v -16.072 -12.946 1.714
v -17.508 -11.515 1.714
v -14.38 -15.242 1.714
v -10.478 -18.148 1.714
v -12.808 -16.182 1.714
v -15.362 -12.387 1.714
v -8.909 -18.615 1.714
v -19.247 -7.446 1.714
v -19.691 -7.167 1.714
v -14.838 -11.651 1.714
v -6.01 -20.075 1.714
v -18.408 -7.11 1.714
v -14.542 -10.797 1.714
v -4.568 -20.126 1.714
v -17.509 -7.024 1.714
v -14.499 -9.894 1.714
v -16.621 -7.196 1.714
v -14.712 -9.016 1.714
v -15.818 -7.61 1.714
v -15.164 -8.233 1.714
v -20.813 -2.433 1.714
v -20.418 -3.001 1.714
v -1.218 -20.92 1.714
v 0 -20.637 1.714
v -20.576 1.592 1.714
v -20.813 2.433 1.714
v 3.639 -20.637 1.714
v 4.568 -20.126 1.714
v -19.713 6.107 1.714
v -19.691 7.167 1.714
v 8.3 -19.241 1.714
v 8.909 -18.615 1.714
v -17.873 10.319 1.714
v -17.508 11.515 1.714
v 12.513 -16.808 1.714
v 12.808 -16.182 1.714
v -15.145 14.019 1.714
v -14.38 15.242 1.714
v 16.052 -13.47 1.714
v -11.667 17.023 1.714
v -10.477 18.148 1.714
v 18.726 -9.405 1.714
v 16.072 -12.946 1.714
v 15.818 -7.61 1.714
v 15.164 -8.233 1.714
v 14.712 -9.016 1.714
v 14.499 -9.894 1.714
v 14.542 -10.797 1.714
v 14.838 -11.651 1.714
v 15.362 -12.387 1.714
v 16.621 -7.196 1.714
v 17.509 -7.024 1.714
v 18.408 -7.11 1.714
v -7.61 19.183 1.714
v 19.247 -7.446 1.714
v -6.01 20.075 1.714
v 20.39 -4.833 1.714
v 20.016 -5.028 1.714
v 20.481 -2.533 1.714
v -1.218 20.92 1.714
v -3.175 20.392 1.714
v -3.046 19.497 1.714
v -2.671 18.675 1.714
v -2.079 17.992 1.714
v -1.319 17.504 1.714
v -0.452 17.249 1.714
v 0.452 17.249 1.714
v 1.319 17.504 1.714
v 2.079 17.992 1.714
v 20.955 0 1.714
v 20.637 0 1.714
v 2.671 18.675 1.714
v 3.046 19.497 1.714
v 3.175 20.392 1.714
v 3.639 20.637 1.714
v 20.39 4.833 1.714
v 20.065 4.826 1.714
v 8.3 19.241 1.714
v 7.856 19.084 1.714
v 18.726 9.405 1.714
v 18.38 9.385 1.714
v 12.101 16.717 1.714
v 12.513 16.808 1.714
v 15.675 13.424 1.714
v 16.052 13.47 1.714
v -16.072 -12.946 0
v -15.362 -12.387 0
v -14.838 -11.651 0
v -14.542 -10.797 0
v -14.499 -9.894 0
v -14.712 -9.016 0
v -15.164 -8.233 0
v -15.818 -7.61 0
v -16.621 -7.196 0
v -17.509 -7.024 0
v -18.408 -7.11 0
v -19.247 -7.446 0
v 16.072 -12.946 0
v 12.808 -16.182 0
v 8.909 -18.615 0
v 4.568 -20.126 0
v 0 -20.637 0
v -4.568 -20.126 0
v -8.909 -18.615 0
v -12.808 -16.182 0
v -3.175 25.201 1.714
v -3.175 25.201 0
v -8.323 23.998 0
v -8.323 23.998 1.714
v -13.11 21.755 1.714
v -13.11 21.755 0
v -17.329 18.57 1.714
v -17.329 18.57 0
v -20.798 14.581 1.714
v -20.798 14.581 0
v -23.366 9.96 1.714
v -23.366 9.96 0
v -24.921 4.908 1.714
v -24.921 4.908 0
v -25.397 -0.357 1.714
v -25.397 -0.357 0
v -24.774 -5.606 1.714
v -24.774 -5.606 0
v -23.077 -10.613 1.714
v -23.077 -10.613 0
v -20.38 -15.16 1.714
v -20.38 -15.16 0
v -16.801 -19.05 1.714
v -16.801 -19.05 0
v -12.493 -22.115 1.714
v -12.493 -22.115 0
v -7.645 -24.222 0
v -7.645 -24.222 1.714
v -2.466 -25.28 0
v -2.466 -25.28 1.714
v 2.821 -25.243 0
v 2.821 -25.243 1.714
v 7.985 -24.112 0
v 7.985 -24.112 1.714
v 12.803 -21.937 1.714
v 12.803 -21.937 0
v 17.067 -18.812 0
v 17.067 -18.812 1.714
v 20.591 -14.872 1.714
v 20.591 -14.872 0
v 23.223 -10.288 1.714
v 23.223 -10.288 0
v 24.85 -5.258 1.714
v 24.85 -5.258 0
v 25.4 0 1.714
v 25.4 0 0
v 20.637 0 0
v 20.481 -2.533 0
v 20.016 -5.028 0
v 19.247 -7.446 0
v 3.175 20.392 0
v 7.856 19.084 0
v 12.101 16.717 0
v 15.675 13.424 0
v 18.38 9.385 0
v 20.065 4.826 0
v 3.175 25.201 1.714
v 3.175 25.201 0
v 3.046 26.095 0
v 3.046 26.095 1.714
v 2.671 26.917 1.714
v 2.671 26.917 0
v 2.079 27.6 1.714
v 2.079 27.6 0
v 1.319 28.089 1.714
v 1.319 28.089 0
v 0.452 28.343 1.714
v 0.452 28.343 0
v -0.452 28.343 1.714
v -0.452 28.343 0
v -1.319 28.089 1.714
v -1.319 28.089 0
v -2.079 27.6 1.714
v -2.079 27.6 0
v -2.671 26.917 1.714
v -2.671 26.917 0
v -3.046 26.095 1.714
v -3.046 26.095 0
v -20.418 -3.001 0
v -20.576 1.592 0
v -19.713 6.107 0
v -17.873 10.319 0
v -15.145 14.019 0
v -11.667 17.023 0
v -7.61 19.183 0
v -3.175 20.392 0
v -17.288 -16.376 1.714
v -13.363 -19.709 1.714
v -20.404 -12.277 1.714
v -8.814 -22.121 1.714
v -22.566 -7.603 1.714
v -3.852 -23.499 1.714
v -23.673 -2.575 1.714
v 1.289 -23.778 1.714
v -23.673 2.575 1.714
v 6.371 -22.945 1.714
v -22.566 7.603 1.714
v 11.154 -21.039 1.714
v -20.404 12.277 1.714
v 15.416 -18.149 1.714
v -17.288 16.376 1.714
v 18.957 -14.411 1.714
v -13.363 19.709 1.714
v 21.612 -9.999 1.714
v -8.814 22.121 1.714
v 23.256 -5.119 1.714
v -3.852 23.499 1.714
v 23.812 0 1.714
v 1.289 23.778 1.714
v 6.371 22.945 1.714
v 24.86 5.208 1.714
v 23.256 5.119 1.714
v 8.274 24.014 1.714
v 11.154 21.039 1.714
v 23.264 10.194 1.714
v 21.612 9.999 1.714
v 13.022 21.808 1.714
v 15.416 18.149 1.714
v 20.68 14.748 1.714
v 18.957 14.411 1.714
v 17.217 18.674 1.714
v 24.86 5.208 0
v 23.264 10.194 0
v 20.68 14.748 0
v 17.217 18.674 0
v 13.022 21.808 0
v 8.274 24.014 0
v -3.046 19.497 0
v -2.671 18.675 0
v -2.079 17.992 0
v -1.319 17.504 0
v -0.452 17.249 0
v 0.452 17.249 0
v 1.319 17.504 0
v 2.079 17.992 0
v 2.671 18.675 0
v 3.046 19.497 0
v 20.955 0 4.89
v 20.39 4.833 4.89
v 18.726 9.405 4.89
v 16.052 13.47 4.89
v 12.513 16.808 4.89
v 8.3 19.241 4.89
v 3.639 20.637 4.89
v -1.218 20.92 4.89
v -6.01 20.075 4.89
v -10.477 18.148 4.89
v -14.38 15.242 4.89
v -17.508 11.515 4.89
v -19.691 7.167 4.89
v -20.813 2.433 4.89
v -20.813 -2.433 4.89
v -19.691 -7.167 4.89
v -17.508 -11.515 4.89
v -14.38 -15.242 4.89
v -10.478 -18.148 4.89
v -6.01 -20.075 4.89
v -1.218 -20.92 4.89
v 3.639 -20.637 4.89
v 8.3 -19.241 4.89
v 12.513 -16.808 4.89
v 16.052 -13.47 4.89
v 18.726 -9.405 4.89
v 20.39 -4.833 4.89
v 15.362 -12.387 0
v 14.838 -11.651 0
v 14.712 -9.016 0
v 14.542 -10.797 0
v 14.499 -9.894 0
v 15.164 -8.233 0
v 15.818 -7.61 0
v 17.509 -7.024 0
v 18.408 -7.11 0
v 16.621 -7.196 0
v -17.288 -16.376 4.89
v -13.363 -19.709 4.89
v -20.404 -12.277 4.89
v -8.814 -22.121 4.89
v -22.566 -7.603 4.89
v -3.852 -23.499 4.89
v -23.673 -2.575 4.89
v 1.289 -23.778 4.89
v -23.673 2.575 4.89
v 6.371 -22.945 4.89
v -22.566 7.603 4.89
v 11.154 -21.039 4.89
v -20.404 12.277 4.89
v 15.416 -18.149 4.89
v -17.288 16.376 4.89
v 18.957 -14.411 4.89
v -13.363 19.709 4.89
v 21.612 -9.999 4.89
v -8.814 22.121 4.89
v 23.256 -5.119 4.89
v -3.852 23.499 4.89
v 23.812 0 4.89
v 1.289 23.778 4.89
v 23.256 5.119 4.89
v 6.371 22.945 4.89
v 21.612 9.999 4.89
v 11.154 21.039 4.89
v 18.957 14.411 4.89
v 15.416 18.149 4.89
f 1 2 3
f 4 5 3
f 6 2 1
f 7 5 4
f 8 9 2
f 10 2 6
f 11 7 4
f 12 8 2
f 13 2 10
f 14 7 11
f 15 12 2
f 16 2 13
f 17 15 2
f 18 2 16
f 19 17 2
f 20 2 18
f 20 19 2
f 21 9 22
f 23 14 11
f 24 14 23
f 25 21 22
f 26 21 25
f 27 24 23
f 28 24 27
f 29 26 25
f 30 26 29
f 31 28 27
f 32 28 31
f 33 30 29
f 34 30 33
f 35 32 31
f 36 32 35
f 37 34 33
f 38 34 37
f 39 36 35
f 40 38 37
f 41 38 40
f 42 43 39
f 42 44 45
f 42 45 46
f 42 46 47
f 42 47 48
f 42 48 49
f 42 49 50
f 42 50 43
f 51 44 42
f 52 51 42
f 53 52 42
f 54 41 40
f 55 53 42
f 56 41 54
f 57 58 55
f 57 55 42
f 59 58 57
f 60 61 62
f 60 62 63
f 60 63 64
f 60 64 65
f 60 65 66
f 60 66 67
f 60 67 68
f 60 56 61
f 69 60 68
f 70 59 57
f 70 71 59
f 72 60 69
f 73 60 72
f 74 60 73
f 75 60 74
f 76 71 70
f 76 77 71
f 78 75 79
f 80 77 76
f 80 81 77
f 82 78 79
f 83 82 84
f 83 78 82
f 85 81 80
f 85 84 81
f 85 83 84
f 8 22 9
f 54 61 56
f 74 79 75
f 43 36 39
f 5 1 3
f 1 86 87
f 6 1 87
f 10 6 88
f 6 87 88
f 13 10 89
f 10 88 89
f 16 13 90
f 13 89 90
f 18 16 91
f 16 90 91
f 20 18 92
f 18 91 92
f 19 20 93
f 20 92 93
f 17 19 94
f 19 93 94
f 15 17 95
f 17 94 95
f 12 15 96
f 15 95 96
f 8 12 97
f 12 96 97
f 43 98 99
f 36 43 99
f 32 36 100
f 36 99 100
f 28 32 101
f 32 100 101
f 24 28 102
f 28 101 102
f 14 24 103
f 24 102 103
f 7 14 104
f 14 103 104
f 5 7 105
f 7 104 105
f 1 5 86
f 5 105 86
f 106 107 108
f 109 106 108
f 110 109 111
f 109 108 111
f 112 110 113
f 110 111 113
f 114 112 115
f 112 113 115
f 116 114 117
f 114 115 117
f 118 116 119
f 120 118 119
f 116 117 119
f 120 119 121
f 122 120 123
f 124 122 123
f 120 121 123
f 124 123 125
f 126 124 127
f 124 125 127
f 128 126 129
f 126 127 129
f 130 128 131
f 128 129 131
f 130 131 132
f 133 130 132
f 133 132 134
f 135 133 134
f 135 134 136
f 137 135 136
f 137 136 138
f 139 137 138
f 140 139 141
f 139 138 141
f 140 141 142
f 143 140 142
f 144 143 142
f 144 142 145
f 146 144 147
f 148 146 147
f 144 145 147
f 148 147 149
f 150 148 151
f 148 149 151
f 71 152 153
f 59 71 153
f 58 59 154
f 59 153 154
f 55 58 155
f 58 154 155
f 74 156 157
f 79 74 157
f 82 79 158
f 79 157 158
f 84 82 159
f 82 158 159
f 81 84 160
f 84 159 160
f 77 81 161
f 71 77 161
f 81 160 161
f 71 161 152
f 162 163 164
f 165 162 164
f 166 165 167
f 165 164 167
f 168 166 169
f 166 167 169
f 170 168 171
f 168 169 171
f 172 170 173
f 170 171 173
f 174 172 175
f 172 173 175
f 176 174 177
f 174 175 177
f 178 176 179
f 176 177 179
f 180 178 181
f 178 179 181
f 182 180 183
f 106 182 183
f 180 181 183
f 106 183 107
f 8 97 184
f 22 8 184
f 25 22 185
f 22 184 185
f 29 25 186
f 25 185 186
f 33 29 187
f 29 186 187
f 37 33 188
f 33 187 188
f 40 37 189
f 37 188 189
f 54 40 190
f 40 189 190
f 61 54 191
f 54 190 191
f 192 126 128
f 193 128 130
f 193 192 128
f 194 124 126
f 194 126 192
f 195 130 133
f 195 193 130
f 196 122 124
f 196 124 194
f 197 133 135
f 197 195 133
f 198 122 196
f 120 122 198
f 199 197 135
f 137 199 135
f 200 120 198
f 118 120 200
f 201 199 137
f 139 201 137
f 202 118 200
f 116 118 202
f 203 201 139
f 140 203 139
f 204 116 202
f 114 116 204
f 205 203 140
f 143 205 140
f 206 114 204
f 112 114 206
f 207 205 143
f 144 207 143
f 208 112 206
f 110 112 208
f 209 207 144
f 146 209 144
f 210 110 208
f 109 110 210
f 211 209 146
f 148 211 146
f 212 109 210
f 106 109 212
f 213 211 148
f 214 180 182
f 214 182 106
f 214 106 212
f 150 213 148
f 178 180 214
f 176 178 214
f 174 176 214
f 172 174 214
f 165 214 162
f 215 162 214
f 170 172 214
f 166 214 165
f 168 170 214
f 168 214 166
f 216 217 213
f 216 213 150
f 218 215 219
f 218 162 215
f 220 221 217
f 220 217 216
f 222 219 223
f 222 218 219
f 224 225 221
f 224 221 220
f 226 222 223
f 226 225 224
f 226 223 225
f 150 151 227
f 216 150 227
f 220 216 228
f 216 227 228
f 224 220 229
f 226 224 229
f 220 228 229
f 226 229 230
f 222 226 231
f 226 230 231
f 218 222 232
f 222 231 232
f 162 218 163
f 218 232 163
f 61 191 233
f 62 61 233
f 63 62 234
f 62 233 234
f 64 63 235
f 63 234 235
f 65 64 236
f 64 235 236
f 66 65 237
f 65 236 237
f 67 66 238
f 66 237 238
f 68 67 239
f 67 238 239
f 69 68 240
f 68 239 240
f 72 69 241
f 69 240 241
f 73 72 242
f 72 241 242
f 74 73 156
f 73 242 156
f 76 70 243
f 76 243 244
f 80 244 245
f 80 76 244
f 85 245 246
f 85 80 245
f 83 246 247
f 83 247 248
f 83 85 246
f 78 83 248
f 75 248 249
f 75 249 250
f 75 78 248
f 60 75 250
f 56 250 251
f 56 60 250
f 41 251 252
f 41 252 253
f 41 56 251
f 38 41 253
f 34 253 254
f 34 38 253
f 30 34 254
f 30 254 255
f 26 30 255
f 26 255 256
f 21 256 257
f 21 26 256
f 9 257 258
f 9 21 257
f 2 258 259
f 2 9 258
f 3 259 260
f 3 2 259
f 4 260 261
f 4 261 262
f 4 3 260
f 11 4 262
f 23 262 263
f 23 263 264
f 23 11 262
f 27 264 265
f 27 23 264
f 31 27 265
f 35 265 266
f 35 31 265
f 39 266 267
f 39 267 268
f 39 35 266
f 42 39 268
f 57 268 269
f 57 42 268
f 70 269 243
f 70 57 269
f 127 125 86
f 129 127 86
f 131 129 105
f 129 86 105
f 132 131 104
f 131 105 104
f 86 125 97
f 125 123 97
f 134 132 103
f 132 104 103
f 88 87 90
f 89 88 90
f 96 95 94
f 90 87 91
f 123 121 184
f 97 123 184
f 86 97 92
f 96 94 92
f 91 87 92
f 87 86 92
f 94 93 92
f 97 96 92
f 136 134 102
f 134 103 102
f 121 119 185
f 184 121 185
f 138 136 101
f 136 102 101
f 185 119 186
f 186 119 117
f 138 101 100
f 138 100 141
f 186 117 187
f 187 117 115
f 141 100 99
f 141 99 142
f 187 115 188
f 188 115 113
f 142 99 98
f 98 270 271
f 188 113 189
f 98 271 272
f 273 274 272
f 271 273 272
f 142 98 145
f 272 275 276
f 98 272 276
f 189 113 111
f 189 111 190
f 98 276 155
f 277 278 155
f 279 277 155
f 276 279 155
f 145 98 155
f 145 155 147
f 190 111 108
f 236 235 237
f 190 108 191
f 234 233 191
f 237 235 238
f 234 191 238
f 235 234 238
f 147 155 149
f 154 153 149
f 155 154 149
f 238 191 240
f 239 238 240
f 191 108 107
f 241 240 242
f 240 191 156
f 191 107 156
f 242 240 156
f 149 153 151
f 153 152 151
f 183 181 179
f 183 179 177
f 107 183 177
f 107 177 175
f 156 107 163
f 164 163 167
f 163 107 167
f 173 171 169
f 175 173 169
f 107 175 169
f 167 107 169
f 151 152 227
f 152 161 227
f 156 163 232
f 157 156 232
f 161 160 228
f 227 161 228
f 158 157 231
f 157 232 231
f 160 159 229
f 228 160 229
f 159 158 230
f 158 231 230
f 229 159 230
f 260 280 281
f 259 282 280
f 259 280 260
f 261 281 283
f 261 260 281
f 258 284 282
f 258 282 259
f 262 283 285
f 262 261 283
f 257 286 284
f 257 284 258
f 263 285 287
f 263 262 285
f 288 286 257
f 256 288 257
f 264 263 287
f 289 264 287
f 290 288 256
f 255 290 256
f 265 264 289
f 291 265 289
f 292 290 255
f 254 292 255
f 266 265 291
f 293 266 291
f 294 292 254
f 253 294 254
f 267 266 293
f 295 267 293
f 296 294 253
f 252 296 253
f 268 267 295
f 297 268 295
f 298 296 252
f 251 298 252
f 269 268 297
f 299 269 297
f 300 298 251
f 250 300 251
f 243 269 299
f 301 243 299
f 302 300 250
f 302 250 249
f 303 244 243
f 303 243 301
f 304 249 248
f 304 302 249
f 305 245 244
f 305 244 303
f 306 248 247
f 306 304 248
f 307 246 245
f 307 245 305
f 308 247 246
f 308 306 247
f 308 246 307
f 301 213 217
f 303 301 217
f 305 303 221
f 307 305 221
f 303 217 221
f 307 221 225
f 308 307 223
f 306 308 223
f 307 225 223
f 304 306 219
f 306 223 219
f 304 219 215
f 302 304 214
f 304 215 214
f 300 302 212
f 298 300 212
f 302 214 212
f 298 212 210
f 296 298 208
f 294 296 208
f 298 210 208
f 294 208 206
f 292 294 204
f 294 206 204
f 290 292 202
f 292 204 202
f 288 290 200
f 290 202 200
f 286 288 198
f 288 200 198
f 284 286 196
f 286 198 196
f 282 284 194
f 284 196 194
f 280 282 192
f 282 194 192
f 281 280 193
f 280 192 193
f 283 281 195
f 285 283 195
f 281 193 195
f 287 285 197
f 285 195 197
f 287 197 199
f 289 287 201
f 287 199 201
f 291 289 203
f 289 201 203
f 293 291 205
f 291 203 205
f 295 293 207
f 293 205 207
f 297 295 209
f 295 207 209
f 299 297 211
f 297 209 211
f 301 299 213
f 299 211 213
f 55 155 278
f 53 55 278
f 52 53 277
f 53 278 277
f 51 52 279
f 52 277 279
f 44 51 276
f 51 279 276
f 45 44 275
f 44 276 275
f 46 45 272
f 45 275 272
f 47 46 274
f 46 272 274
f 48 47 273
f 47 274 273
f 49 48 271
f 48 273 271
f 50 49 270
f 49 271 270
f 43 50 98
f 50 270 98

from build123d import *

# Parameters (mm, degrees)
F1_DEPTH = 1.7145
F2_R     = 23.8125
F2_R_2   = 20.955
F3_DEPTH = 3.175


with BuildPart() as f1:
    # F0 (on Top) → F1 (new body)
    with BuildSketch(Plane.XY):
        with BuildLine():
            ThreePointArc((-3.175, 25.2007812379), (-16.8005208253, -19.05), (25.4, 0))
            ThreePointArc((25.4, 0), (19.05, 16.8005208253), (3.175, 25.2007812379))
            ThreePointArc((3.175, 25.2007812379), (0, 25.4), (-3.175, 25.2007812379))
        make_face()
        with BuildLine():
            ThreePointArc((3.175, 20.3918067186), (15.6753065161, 13.4235305294), (20.6375, 0))
            ThreePointArc((20.6375, 0), (20.2869789198, -3.7874651889), (19.2473226474, -7.4462727023))
            ThreePointArc((19.2473226474, -7.4462727023), (17.8725992706, -10.31875), (16.0723226474, -12.9455340163))
            ThreePointArc((16.0723226474, -12.9455340163), (0, -20.6375), (-16.0723226474, -12.9455340163))
            ThreePointArc((-16.0723226474, -12.9455340163), (-17.8725992706, -10.31875), (-19.2473226474, -7.4462727023))
            ThreePointArc((-19.2473226474, -7.4462727023), (-17.8725992706, 10.31875), (-3.175, 20.3918067186))
            ThreePointArc((-3.175, 20.3918067186), (0, 20.6375), (3.175, 20.3918067186))
        make_face(mode=Mode.SUBTRACT)
        with BuildLine():
            ThreePointArc((-3.175, 20.3918067186), (0, 17.2168067186), (3.175, 20.3918067186))
            ThreePointArc((3.175, 20.3918067186), (0, 20.6375), (-3.175, 20.3918067186))
        make_face()
        with BuildLine():
            ThreePointArc((-16.0723226474, -12.9455340163), (-14.9101919904, -8.6084033593), (-19.2473226474, -7.4462727023))
            ThreePointArc((-19.2473226474, -7.4462727023), (-17.8725992706, -10.31875), (-16.0723226474, -12.9455340163))
        make_face()
        with BuildLine():
            ThreePointArc((16.0723226474, -12.9455340163), (17.8725992706, -10.31875), (19.2473226474, -7.4462727023))
            ThreePointArc((19.2473226474, -7.4462727023), (14.9101919904, -8.6084033593), (16.0723226474, -12.9455340163))
        make_face()
        with BuildLine():
            ThreePointArc((-3.175, 25.2007812379), (0, 25.4), (3.175, 25.2007812379))
            ThreePointArc((3.175, 25.2007812379), (0, 28.3757812379), (-3.175, 25.2007812379))
        make_face()
    extrude(amount=F1_DEPTH)

    # F2 (on face) → F3 (join)
    with BuildSketch(Plane.XY.offset(1.7145)):
        Circle(F2_R)
        Circle(F2_R_2, mode=Mode.SUBTRACT)
    extrude(amount=F3_DEPTH)


solid = f1.part
